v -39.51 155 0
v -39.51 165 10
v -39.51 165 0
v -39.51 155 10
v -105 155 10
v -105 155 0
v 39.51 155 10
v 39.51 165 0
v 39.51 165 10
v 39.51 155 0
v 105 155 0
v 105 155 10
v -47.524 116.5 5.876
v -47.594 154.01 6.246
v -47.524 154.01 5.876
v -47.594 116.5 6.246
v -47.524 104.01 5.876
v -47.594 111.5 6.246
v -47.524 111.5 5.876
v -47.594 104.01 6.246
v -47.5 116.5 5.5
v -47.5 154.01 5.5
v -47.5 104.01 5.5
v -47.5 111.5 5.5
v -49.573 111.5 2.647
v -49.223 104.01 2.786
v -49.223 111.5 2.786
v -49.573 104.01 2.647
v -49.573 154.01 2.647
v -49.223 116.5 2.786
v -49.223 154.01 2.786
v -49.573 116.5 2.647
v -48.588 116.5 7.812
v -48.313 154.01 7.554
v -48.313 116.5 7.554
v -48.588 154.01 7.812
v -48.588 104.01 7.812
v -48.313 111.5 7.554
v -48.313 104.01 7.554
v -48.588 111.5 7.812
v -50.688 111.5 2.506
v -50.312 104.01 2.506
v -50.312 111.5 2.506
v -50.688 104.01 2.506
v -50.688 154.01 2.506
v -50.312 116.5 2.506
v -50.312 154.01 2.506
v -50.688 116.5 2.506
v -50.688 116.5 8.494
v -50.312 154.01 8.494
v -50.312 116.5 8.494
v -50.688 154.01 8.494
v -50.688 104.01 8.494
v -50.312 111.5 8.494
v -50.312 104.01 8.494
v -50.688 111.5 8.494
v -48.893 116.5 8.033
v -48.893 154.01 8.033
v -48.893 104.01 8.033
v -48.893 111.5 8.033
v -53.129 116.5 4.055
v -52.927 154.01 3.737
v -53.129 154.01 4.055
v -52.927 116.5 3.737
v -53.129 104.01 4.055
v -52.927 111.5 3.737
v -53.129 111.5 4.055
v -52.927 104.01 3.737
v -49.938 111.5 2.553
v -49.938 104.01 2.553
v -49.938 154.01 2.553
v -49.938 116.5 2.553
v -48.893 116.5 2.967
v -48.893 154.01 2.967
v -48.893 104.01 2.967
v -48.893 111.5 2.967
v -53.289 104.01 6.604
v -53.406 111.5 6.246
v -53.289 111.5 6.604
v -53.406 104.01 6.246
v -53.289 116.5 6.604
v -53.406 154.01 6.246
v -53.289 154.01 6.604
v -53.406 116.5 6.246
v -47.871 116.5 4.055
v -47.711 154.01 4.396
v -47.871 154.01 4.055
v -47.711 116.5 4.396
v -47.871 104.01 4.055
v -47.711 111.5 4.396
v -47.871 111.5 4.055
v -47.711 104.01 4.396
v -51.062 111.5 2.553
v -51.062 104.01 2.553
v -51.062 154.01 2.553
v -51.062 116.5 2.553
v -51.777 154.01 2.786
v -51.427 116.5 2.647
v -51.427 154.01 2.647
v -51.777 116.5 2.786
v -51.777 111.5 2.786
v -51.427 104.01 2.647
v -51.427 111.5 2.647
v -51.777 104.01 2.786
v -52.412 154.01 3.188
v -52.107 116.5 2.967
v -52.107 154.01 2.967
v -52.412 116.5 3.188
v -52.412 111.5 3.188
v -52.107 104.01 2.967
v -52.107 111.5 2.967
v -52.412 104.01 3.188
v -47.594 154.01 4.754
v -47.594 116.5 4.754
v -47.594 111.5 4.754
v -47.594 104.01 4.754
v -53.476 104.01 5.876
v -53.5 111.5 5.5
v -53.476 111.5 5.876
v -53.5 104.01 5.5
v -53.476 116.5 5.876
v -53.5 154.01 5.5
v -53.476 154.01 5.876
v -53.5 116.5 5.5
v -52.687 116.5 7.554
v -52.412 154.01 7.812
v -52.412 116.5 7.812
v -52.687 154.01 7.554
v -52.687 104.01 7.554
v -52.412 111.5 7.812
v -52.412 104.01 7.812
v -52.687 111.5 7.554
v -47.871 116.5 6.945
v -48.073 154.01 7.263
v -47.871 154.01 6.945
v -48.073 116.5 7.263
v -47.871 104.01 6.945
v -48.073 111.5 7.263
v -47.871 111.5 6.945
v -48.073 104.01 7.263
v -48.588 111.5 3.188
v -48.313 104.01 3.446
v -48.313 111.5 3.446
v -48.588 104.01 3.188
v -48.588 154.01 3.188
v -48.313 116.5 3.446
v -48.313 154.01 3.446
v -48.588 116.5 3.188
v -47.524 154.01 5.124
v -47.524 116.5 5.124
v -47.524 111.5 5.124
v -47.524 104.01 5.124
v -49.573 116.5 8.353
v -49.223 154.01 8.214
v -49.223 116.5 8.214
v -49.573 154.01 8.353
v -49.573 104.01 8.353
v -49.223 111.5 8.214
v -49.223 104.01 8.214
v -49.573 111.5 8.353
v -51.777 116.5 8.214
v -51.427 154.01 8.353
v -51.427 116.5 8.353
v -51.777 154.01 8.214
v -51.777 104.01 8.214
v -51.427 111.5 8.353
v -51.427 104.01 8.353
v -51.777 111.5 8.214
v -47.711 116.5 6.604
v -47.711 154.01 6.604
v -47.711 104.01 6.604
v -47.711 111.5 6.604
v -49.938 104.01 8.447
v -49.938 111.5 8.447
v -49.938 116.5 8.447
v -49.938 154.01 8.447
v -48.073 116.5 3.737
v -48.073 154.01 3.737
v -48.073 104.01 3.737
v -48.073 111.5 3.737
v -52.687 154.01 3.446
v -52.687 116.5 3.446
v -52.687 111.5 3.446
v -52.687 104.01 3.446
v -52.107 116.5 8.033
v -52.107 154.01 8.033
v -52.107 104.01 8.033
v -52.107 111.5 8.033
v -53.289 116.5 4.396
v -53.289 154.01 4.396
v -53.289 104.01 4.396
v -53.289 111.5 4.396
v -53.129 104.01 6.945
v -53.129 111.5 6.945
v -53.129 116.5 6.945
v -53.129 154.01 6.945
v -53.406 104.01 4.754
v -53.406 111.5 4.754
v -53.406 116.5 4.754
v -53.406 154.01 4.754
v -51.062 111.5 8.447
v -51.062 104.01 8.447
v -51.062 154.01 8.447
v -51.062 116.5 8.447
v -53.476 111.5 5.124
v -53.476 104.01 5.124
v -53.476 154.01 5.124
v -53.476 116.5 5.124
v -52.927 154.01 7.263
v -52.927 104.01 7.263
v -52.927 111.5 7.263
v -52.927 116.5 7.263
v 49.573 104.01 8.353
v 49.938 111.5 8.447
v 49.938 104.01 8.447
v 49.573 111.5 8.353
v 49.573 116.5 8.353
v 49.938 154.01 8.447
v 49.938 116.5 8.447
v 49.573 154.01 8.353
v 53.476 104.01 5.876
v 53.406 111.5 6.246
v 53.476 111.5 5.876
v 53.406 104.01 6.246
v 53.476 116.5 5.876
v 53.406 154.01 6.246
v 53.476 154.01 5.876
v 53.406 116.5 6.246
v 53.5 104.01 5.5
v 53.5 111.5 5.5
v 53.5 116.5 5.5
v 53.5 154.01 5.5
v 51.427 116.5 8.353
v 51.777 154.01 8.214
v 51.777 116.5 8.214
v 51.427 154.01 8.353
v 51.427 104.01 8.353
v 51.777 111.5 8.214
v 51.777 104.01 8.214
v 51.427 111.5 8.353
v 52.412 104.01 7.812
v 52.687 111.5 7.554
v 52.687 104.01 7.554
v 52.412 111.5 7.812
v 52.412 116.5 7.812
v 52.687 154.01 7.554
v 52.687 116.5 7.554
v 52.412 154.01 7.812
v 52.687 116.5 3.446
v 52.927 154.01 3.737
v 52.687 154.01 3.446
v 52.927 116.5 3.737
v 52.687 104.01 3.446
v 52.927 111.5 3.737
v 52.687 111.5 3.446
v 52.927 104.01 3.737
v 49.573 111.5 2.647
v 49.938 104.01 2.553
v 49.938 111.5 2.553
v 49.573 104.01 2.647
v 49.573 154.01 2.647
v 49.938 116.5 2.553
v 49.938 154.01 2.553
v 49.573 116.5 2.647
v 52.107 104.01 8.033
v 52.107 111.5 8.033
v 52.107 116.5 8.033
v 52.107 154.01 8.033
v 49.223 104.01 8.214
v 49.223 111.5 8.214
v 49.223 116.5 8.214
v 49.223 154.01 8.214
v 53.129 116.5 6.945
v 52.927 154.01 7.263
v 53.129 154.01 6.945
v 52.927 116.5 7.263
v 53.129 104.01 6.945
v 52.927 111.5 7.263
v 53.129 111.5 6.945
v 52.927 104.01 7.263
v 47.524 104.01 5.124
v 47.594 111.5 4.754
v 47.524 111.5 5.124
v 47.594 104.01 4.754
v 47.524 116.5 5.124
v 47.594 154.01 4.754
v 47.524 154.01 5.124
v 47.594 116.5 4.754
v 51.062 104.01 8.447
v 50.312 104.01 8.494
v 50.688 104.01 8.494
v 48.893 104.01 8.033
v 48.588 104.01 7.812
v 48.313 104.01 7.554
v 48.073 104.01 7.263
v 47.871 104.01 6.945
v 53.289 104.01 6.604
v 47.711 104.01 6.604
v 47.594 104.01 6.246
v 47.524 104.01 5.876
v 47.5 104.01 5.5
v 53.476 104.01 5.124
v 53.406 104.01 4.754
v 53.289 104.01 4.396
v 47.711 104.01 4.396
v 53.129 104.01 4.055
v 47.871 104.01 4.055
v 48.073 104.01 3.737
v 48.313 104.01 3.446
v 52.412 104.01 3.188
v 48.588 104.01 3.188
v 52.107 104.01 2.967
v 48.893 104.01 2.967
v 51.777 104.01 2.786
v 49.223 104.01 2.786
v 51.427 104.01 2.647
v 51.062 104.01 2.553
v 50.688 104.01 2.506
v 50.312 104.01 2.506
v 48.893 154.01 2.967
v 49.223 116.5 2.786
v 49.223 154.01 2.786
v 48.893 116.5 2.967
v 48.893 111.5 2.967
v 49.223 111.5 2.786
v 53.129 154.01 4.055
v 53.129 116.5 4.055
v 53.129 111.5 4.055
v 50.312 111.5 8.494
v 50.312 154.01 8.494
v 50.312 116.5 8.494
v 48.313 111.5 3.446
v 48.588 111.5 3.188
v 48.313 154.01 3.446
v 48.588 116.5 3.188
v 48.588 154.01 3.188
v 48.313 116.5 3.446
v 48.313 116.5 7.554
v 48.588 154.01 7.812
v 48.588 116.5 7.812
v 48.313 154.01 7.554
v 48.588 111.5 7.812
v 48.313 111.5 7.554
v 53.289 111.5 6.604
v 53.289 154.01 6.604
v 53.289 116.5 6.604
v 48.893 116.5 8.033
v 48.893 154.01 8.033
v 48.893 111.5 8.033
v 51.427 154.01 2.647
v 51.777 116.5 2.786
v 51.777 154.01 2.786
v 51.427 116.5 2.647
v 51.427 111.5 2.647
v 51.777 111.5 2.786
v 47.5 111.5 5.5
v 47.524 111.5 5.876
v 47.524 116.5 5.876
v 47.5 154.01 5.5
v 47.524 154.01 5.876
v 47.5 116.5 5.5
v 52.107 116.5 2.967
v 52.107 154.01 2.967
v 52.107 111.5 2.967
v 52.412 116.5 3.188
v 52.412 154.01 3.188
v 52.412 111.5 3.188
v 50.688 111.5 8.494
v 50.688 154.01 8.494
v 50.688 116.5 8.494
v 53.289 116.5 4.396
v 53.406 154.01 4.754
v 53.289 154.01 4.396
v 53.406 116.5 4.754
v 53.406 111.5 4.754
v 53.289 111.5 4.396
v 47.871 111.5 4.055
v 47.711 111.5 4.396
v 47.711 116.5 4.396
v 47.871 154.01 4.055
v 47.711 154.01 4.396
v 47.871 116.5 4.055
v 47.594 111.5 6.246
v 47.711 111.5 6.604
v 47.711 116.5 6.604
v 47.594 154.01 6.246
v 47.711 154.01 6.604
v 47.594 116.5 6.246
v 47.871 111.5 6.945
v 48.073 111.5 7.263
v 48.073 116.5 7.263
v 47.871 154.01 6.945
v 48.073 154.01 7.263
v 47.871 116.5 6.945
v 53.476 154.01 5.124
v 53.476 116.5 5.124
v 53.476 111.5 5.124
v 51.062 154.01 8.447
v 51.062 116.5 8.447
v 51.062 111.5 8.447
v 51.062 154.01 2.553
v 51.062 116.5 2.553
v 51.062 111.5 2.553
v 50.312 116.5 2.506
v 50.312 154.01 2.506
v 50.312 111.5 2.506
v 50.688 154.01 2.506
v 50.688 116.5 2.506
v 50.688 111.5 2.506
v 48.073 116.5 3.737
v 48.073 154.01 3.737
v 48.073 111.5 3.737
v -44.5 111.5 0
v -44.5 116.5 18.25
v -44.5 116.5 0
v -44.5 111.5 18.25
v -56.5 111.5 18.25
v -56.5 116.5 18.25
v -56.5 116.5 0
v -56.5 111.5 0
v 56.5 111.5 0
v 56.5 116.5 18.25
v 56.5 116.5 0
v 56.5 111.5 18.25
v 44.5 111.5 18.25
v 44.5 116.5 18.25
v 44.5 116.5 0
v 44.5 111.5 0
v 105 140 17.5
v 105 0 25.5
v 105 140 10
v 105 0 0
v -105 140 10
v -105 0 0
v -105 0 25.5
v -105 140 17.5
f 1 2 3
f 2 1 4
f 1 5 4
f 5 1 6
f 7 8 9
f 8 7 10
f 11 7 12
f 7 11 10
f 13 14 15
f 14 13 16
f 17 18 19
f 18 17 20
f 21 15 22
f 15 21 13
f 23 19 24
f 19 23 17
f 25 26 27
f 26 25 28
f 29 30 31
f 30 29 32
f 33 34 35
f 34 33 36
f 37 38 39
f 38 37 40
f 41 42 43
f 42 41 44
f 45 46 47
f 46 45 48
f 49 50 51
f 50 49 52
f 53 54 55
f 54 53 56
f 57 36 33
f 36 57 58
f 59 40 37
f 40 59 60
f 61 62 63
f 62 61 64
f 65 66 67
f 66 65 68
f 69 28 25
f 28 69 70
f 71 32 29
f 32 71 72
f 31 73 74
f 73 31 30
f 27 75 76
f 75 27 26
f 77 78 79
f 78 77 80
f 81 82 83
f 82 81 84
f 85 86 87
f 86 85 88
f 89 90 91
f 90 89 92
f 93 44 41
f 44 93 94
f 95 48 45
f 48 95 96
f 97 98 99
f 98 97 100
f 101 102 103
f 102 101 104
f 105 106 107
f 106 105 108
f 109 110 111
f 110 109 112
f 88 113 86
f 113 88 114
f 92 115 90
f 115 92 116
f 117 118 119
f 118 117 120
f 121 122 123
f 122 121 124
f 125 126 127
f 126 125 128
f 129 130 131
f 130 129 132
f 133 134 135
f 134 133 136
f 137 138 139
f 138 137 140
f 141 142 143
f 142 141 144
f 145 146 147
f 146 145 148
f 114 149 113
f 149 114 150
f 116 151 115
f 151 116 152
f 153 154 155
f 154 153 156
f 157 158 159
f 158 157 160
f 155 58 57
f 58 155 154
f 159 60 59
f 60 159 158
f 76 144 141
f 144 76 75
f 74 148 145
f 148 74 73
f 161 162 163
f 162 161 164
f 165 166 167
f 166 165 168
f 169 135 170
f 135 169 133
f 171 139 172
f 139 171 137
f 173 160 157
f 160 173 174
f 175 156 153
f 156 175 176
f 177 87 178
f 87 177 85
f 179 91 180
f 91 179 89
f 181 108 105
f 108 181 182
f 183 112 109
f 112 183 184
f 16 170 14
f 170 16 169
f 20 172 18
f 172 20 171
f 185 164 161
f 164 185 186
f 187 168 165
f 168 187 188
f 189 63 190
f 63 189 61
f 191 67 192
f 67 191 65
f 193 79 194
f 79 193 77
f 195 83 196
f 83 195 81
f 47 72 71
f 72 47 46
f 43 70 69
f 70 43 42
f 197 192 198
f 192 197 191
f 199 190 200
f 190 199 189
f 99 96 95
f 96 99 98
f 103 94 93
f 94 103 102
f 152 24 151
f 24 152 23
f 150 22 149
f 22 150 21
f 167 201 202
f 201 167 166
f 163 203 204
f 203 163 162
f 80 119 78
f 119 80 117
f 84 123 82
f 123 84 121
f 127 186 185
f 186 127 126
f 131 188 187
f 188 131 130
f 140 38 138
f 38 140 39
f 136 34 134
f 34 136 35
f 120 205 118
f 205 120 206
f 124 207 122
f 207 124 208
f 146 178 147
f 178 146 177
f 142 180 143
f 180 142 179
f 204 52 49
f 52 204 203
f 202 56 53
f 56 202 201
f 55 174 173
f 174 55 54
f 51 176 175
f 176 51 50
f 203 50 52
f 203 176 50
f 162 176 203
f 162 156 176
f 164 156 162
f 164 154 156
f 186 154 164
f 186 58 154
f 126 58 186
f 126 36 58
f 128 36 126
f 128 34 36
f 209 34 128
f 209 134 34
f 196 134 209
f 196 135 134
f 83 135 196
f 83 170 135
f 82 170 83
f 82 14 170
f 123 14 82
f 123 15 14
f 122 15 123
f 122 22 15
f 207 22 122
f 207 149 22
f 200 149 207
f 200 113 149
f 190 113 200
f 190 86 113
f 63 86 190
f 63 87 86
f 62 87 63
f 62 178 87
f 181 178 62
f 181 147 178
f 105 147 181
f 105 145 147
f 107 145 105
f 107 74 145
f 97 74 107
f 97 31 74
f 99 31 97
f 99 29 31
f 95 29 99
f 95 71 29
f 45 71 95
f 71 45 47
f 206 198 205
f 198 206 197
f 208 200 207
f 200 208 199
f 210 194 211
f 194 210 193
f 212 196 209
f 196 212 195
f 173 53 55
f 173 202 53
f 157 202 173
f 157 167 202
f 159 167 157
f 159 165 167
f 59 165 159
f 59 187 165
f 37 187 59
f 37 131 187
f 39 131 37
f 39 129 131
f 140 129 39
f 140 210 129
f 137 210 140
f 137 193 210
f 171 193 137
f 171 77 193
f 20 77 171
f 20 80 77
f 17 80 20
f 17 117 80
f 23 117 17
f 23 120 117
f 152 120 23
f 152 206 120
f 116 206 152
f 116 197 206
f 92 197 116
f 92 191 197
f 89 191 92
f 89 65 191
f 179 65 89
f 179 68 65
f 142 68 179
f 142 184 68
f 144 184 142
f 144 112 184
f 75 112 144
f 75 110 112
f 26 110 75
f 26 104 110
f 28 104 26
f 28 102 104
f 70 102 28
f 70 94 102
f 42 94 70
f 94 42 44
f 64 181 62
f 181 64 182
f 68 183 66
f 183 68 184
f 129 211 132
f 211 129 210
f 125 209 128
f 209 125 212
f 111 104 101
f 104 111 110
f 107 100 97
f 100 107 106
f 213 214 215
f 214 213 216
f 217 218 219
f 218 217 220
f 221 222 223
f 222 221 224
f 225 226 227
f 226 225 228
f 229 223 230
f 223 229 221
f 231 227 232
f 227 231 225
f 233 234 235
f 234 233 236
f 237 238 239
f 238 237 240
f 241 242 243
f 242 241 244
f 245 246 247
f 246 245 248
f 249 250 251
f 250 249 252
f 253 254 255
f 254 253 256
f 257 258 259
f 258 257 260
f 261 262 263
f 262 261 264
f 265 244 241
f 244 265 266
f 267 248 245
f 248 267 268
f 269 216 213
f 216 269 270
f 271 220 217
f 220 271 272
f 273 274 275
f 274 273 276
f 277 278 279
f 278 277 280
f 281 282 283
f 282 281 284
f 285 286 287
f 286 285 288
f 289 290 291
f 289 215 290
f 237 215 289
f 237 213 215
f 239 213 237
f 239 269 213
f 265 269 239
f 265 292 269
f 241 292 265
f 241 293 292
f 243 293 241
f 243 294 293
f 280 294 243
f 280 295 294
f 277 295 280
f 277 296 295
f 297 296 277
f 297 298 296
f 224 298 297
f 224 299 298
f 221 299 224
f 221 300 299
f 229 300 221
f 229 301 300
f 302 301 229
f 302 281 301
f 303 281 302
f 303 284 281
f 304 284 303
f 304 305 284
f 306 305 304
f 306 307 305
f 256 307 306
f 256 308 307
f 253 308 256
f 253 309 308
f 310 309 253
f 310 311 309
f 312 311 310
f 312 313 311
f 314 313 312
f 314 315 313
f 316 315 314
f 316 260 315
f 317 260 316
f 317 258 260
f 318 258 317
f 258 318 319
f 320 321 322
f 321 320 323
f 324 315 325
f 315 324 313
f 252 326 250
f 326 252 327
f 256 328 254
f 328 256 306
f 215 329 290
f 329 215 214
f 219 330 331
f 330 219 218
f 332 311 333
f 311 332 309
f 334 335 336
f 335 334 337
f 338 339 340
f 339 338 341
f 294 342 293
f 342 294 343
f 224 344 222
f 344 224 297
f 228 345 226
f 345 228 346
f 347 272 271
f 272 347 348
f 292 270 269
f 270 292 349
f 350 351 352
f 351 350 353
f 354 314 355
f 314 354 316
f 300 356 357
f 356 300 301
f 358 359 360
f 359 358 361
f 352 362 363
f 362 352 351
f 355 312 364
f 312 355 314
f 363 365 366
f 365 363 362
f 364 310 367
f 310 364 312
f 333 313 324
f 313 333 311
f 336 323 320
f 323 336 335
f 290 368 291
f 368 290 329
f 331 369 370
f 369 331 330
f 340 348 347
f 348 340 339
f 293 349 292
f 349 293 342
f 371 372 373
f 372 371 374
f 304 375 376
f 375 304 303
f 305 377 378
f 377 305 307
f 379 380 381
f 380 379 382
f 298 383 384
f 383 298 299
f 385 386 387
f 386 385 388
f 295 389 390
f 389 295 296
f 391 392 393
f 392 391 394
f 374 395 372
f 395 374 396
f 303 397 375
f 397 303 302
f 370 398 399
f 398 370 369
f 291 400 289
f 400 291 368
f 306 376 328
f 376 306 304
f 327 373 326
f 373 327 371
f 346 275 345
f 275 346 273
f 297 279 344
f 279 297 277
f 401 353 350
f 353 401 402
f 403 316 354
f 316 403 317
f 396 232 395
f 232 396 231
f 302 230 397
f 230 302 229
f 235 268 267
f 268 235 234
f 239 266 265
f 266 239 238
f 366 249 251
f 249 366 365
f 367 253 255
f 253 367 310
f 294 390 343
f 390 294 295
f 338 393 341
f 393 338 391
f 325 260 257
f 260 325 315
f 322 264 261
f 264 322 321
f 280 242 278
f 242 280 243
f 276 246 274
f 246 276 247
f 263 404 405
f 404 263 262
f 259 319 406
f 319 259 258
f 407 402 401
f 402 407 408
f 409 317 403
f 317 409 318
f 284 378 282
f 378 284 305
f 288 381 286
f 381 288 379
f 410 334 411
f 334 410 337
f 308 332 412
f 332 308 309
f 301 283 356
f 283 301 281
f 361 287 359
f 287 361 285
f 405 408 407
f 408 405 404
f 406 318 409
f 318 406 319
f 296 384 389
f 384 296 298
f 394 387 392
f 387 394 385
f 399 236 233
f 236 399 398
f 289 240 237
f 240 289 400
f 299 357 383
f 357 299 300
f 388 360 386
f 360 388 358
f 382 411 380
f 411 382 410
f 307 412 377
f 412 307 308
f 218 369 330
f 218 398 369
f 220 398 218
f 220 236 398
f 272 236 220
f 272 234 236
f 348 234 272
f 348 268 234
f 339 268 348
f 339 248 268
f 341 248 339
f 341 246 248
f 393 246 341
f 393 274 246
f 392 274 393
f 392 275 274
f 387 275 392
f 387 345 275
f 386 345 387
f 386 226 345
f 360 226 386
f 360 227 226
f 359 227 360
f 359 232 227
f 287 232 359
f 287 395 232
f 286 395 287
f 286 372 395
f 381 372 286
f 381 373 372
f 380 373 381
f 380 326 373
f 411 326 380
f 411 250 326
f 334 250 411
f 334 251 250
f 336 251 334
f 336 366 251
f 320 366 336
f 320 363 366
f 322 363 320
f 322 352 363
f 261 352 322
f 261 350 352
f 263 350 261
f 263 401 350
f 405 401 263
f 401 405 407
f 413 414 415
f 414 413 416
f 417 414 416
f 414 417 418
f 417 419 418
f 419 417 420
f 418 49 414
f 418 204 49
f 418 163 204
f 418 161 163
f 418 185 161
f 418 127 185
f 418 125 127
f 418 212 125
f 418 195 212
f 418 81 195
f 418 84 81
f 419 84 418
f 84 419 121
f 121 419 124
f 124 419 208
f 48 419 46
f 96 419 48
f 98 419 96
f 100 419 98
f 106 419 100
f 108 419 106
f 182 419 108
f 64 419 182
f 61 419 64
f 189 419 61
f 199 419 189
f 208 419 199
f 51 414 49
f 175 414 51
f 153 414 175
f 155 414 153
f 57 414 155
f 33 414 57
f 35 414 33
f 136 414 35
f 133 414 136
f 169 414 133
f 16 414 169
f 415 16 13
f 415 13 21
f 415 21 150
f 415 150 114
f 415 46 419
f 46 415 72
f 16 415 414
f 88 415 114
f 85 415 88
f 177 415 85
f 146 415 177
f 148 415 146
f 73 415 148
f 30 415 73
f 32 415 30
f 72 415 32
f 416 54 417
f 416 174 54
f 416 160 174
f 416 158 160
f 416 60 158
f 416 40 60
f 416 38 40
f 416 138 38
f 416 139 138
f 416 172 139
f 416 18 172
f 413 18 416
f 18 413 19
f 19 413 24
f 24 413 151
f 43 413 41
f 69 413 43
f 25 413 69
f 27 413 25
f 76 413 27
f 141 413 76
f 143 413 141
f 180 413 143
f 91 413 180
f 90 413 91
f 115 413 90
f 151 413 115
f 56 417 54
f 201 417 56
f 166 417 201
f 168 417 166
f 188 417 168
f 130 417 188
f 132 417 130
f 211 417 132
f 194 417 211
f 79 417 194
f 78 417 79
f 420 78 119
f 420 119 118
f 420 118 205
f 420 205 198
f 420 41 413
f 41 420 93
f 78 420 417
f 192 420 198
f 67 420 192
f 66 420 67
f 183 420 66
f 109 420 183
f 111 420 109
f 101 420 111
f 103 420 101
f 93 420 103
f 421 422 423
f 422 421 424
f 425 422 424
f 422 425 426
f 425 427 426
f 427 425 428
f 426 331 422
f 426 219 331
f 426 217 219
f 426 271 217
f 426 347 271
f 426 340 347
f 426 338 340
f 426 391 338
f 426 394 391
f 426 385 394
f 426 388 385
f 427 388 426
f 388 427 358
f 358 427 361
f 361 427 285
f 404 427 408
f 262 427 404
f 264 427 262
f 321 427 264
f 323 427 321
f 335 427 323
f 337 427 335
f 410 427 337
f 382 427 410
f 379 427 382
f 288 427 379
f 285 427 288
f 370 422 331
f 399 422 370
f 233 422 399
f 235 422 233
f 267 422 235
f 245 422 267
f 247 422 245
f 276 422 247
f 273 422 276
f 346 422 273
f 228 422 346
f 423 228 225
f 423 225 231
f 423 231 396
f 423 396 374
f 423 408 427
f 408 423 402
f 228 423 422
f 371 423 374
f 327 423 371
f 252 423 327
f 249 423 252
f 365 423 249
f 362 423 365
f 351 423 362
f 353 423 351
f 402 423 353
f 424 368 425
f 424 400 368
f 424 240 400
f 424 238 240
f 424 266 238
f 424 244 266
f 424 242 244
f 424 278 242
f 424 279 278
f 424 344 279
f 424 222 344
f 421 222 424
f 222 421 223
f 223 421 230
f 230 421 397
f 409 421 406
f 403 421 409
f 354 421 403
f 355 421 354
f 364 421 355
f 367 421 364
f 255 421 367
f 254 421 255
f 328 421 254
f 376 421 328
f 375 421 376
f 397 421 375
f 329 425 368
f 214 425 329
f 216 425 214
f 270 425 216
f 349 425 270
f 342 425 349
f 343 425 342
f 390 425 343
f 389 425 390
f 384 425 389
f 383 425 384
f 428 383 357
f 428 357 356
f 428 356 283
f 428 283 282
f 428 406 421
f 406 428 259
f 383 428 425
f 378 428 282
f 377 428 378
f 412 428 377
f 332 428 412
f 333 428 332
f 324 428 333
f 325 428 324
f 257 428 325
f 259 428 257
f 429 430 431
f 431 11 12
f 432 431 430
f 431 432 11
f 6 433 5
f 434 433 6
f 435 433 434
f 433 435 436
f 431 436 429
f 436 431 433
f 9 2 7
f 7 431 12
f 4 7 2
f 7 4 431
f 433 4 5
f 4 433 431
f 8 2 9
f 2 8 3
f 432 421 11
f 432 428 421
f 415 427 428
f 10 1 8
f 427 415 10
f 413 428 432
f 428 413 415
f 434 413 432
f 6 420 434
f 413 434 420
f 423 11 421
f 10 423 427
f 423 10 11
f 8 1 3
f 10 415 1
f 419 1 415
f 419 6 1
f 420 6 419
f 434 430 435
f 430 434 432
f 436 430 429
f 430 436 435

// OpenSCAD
include <../libs/pw_primitives.scad>;

inlet_length = 116;  // not quite?
inlet_width = 100;  // not quite?

plate_corner_r = 5;
top_p_length = 155;  top_p_l = top_p_length - plate_corner_r*2;
top_p_width = 155;  top_p_w = top_p_width - plate_corner_r*2;
top_p_thick = 5;  top_p_t_eps = top_p_thick +0.03;
t_bolt_hole_edge_off = 7;  // to edge of hole
t_bolt_hole_dia = 5;
t_bolt_hole_x = top_p_length/2 - t_bolt_hole_edge_off - t_bolt_hole_dia/2;
t_bolt_hole_y = top_p_width/2 - t_bolt_hole_edge_off - t_bolt_hole_dia/2;
through_hole_x_off = 9.5;  // to center
through_hole_y_off = 34;
through_hole_dia = 9;
through_hole_x = top_p_length/2 - through_hole_x_off;
through_hole_y = top_p_width/2 - through_hole_y_off;

funnel_thick = 3;  funnel_height = 150;

module shredder_inlet_outlet_template() union() {
    // center inlet hole
    square([inlet_length, inlet_width], center=true);
    // holes to put bolt holes
    translate([-b_bolt_hole_x, -b_bolt_hole_y]) circle(d=b_bolt_hole_dia);
    translate([-b_bolt_hole_x, +b_bolt_hole_y]) circle(d=b_bolt_hole_dia);
    translate([+b_bolt_hole_x, -b_bolt_hole_y]) circle(d=b_bolt_hole_dia);
    translate([+b_bolt_hole_x, +b_bolt_hole_y]) circle(d=b_bolt_hole_dia);
    // holes to avoid shredder bolts
    translate([-through_hole_x, -through_hole_y]) circle(d=b_through_hole_dia);
    translate([-through_hole_x, +through_hole_y]) circle(d=b_through_hole_dia);
    translate([+through_hole_x, -through_hole_y]) circle(d=b_through_hole_dia);
    translate([+through_hole_x, +through_hole_y]) circle(d=b_through_hole_dia);
};

module rounded_rect(x, y, rad) {
    // a rectangle fitting inside x, y, with rounded corners.
    xmr2 = x - rad*2;  ymr2 = y - rad*2;
    offset(rad) square([xmr2, ymr2], center=true);
};

$fn = $preview ? 20 : 50;
// inlet funnel
module inlet_funnel() union() {
    // base plate
    linear_extrude(top_p_thick) difference() {
        rounded_rect(top_p_length, top_p_width, plate_corner_r);
        shredder_inlet_outlet_template();
    }
    // inlet funnel
    linear_extrude(funnel_height) difference() {
        offset(funnel_thick) square([inlet_length, inlet_width], center=true);
        square([inlet_length, inlet_width], center=true);
    }
}

bot_p_corner_r = 5;
bot_p_length = 155;  bot_p_l = bot_p_length - bot_p_corner_r*2;
bot_p_width = 180;  bot_p_w = bot_p_width - bot_p_corner_r*2;
bot_p_thick = 5;  bot_p_t_eps = bot_p_thick +0.03;

bot_b_length = 180;  bot_b_l = bot_b_length - bot_p_corner_r*2;
bot_b_width = 126;  bot_b_w = bot_b_width - bot_p_corner_r*2;
bot_b_thick = 20;  bolt_p_b_off = bot_b_thick - bot_p_thick;

b_bolt_hole_x_off = 27;  // from outer edge of plate to centre
b_bolt_hole_y_off = 21;
b_bolt_hole_dia = 6;
b_bolt_outer_dia = 10;
b_bolt_hole_x = bot_p_length/2 - b_bolt_hole_x_off;
b_bolt_hole_y = bot_p_width/2 - b_bolt_hole_y_off;

b_through_hole_dia = 10.5;

// basic outlet mount
module basic_outlet_plate() difference() {
    // base plate
    filleted_hexahedron(
      bot_b_length/2, bot_b_width/2, bot_p_length/2, bot_p_width/2, 
      bot_b_thick, bot_p_corner_r
    );
    // all the holes
    translate([0, 0, -0.01]) linear_extrude(bot_b_thick+0.02)
      shredder_inlet_outlet_template();
    translate([0, 0, -0.01]) linear_extrude(bolt_p_b_off) union() {
        // clearance holes for bolts to secure to shredder
        translate([-b_bolt_hole_x, -b_bolt_hole_y]) circle(d=b_bolt_outer_dia);
        translate([-b_bolt_hole_x, +b_bolt_hole_y]) circle(d=b_bolt_outer_dia);
        translate([+b_bolt_hole_x, -b_bolt_hole_y]) circle(d=b_bolt_outer_dia);
        translate([+b_bolt_hole_x, +b_bolt_hole_y]) circle(d=b_bolt_outer_dia);
    }
};

container_height = 154;  container_rim_low_height = 140;
container_length = 210;
container_top_width = 148;  container_in_width = 130;
container_top_in_width = 133;
container_bot_width = 117;
container_lip_wid_2 = (container_top_width - container_top_in_width) / 2;
container_bot_wid_2 = (container_top_width - container_bot_width) / 2;
container_top_thick = 11;  container_top_rad = 10;

// top outlet plate - mostly centred coordinates
module box_loader_outlet_plate() difference() {
    linear_extrude(container_top_thick, convexity=4) difference() {
        rounded_rect(container_length, container_width, container_top_rad);
        shredder_inlet_outlet_template();
    };
    // wall mortises
    translate([0, +upright_wall_y_off, mortise_z_off])
      cube([mortise_length, upright_wall_top_thick, container_top_thick+0.02],
        center=true);
    translate([0, -upright_wall_y_off, mortise_z_off])
      cube([mortise_length, upright_wall_top_thick, container_top_thick+0.02],
        center=true);
}

full_support_height = container_height + 2;
upright_wall_top_thick = 10;
upright_wall_lip_thick = upright_wall_top_thick + container_lip_wid_2;
upright_wall_base_thick = upright_wall_top_thick + container_bot_wid_2;
upright_wall_y_off = (container_top_width - upright_wall_top_thick) / 2 + 0.01;
mortise_length = 80;  mortise_tol = +0.5;
mortise_neg_length = (container_length - mortise_length) / 2 + mortise_tol;
mortise_z_off = (container_top_thick/2);
upright_wall_mortise_h_off = (
  container_height + container_top_thick - upright_wall_top_thick
);
plate_bolt_hole_len = 50;
plate_bolt_nut_hgt = 40;
plate_bolt_nut_len = 12; plate_bolt_nut_wid = 5;
plate_bolt_nut_y_off = container_height - plate_bolt_nut_hgt;

// side upright plate - 'height' here is +Y
module box_loader_side_plate(container_length) difference() {
    // side profile, extruded and then moved back to centred X coordinates
    txl(x=container_length/2) 
    rot(y=-90) linear_extrude(container_length, convexity=4) polygon([
        // origin is base outer of LHS - inner is +X, height is +Y
        [0, 0], [0, container_height+container_top_thick],
        [upright_wall_top_thick, container_height+container_top_thick],
        [upright_wall_top_thick, container_rim_low_height],
        [upright_wall_lip_thick, container_rim_low_height],
        [upright_wall_base_thick, 0],
    ]);
    // group subtractions when length not just a template
    if (container_length > 10) union() {
        // mortise removes
        translate([-container_length/2-0.01, upright_wall_mortise_h_off, -0.01])
        cube([mortise_neg_length, upright_wall_top_thick+0.01,
          container_top_thick+0.02]);
        translate([container_length/2+0.01-mortise_neg_length,
          upright_wall_mortise_h_off, -0.01])
        cube([mortise_neg_length, upright_wall_top_thick+0.01,
          container_top_thick+0.02]);
        // holes to fit bolt to shredder to and hold top and side together
        translate([-b_bolt_hole_x, container_height+0.01, container_top_thick/2])
          rot(x=90) cylinder(h=plate_bolt_hole_len, d=b_bolt_hole_dia);
        translate([+b_bolt_hole_x, container_height+0.01, container_top_thick/2])
          rot(x=90) cylinder(h=plate_bolt_hole_len, d=b_bolt_hole_dia);
        // holes to push nuts into that hold the bolts
        translate([-b_bolt_hole_x, plate_bolt_nut_y_off, container_top_thick/2])
          cube([plate_bolt_nut_len, plate_bolt_nut_wid, upright_wall_base_thick],
            center=true);
        translate([+b_bolt_hole_x, plate_bolt_nut_y_off, container_top_thick/2])
          cube([plate_bolt_nut_len, plate_bolt_nut_wid, upright_wall_base_thick],
            center=true);
    };
}

* union() {
    txl(y=container_width/2 +1) rot(x=90)
      box_loader_side_plate(container_length);
    txl(y=-container_width/2 -1) rot(x=-90) rot(z=180)
      box_loader_side_plate(container_length);
    color("green") txl(z=container_height +1) box_loader_outlet_plate();
}

box_loader_side_plate(container_length);
